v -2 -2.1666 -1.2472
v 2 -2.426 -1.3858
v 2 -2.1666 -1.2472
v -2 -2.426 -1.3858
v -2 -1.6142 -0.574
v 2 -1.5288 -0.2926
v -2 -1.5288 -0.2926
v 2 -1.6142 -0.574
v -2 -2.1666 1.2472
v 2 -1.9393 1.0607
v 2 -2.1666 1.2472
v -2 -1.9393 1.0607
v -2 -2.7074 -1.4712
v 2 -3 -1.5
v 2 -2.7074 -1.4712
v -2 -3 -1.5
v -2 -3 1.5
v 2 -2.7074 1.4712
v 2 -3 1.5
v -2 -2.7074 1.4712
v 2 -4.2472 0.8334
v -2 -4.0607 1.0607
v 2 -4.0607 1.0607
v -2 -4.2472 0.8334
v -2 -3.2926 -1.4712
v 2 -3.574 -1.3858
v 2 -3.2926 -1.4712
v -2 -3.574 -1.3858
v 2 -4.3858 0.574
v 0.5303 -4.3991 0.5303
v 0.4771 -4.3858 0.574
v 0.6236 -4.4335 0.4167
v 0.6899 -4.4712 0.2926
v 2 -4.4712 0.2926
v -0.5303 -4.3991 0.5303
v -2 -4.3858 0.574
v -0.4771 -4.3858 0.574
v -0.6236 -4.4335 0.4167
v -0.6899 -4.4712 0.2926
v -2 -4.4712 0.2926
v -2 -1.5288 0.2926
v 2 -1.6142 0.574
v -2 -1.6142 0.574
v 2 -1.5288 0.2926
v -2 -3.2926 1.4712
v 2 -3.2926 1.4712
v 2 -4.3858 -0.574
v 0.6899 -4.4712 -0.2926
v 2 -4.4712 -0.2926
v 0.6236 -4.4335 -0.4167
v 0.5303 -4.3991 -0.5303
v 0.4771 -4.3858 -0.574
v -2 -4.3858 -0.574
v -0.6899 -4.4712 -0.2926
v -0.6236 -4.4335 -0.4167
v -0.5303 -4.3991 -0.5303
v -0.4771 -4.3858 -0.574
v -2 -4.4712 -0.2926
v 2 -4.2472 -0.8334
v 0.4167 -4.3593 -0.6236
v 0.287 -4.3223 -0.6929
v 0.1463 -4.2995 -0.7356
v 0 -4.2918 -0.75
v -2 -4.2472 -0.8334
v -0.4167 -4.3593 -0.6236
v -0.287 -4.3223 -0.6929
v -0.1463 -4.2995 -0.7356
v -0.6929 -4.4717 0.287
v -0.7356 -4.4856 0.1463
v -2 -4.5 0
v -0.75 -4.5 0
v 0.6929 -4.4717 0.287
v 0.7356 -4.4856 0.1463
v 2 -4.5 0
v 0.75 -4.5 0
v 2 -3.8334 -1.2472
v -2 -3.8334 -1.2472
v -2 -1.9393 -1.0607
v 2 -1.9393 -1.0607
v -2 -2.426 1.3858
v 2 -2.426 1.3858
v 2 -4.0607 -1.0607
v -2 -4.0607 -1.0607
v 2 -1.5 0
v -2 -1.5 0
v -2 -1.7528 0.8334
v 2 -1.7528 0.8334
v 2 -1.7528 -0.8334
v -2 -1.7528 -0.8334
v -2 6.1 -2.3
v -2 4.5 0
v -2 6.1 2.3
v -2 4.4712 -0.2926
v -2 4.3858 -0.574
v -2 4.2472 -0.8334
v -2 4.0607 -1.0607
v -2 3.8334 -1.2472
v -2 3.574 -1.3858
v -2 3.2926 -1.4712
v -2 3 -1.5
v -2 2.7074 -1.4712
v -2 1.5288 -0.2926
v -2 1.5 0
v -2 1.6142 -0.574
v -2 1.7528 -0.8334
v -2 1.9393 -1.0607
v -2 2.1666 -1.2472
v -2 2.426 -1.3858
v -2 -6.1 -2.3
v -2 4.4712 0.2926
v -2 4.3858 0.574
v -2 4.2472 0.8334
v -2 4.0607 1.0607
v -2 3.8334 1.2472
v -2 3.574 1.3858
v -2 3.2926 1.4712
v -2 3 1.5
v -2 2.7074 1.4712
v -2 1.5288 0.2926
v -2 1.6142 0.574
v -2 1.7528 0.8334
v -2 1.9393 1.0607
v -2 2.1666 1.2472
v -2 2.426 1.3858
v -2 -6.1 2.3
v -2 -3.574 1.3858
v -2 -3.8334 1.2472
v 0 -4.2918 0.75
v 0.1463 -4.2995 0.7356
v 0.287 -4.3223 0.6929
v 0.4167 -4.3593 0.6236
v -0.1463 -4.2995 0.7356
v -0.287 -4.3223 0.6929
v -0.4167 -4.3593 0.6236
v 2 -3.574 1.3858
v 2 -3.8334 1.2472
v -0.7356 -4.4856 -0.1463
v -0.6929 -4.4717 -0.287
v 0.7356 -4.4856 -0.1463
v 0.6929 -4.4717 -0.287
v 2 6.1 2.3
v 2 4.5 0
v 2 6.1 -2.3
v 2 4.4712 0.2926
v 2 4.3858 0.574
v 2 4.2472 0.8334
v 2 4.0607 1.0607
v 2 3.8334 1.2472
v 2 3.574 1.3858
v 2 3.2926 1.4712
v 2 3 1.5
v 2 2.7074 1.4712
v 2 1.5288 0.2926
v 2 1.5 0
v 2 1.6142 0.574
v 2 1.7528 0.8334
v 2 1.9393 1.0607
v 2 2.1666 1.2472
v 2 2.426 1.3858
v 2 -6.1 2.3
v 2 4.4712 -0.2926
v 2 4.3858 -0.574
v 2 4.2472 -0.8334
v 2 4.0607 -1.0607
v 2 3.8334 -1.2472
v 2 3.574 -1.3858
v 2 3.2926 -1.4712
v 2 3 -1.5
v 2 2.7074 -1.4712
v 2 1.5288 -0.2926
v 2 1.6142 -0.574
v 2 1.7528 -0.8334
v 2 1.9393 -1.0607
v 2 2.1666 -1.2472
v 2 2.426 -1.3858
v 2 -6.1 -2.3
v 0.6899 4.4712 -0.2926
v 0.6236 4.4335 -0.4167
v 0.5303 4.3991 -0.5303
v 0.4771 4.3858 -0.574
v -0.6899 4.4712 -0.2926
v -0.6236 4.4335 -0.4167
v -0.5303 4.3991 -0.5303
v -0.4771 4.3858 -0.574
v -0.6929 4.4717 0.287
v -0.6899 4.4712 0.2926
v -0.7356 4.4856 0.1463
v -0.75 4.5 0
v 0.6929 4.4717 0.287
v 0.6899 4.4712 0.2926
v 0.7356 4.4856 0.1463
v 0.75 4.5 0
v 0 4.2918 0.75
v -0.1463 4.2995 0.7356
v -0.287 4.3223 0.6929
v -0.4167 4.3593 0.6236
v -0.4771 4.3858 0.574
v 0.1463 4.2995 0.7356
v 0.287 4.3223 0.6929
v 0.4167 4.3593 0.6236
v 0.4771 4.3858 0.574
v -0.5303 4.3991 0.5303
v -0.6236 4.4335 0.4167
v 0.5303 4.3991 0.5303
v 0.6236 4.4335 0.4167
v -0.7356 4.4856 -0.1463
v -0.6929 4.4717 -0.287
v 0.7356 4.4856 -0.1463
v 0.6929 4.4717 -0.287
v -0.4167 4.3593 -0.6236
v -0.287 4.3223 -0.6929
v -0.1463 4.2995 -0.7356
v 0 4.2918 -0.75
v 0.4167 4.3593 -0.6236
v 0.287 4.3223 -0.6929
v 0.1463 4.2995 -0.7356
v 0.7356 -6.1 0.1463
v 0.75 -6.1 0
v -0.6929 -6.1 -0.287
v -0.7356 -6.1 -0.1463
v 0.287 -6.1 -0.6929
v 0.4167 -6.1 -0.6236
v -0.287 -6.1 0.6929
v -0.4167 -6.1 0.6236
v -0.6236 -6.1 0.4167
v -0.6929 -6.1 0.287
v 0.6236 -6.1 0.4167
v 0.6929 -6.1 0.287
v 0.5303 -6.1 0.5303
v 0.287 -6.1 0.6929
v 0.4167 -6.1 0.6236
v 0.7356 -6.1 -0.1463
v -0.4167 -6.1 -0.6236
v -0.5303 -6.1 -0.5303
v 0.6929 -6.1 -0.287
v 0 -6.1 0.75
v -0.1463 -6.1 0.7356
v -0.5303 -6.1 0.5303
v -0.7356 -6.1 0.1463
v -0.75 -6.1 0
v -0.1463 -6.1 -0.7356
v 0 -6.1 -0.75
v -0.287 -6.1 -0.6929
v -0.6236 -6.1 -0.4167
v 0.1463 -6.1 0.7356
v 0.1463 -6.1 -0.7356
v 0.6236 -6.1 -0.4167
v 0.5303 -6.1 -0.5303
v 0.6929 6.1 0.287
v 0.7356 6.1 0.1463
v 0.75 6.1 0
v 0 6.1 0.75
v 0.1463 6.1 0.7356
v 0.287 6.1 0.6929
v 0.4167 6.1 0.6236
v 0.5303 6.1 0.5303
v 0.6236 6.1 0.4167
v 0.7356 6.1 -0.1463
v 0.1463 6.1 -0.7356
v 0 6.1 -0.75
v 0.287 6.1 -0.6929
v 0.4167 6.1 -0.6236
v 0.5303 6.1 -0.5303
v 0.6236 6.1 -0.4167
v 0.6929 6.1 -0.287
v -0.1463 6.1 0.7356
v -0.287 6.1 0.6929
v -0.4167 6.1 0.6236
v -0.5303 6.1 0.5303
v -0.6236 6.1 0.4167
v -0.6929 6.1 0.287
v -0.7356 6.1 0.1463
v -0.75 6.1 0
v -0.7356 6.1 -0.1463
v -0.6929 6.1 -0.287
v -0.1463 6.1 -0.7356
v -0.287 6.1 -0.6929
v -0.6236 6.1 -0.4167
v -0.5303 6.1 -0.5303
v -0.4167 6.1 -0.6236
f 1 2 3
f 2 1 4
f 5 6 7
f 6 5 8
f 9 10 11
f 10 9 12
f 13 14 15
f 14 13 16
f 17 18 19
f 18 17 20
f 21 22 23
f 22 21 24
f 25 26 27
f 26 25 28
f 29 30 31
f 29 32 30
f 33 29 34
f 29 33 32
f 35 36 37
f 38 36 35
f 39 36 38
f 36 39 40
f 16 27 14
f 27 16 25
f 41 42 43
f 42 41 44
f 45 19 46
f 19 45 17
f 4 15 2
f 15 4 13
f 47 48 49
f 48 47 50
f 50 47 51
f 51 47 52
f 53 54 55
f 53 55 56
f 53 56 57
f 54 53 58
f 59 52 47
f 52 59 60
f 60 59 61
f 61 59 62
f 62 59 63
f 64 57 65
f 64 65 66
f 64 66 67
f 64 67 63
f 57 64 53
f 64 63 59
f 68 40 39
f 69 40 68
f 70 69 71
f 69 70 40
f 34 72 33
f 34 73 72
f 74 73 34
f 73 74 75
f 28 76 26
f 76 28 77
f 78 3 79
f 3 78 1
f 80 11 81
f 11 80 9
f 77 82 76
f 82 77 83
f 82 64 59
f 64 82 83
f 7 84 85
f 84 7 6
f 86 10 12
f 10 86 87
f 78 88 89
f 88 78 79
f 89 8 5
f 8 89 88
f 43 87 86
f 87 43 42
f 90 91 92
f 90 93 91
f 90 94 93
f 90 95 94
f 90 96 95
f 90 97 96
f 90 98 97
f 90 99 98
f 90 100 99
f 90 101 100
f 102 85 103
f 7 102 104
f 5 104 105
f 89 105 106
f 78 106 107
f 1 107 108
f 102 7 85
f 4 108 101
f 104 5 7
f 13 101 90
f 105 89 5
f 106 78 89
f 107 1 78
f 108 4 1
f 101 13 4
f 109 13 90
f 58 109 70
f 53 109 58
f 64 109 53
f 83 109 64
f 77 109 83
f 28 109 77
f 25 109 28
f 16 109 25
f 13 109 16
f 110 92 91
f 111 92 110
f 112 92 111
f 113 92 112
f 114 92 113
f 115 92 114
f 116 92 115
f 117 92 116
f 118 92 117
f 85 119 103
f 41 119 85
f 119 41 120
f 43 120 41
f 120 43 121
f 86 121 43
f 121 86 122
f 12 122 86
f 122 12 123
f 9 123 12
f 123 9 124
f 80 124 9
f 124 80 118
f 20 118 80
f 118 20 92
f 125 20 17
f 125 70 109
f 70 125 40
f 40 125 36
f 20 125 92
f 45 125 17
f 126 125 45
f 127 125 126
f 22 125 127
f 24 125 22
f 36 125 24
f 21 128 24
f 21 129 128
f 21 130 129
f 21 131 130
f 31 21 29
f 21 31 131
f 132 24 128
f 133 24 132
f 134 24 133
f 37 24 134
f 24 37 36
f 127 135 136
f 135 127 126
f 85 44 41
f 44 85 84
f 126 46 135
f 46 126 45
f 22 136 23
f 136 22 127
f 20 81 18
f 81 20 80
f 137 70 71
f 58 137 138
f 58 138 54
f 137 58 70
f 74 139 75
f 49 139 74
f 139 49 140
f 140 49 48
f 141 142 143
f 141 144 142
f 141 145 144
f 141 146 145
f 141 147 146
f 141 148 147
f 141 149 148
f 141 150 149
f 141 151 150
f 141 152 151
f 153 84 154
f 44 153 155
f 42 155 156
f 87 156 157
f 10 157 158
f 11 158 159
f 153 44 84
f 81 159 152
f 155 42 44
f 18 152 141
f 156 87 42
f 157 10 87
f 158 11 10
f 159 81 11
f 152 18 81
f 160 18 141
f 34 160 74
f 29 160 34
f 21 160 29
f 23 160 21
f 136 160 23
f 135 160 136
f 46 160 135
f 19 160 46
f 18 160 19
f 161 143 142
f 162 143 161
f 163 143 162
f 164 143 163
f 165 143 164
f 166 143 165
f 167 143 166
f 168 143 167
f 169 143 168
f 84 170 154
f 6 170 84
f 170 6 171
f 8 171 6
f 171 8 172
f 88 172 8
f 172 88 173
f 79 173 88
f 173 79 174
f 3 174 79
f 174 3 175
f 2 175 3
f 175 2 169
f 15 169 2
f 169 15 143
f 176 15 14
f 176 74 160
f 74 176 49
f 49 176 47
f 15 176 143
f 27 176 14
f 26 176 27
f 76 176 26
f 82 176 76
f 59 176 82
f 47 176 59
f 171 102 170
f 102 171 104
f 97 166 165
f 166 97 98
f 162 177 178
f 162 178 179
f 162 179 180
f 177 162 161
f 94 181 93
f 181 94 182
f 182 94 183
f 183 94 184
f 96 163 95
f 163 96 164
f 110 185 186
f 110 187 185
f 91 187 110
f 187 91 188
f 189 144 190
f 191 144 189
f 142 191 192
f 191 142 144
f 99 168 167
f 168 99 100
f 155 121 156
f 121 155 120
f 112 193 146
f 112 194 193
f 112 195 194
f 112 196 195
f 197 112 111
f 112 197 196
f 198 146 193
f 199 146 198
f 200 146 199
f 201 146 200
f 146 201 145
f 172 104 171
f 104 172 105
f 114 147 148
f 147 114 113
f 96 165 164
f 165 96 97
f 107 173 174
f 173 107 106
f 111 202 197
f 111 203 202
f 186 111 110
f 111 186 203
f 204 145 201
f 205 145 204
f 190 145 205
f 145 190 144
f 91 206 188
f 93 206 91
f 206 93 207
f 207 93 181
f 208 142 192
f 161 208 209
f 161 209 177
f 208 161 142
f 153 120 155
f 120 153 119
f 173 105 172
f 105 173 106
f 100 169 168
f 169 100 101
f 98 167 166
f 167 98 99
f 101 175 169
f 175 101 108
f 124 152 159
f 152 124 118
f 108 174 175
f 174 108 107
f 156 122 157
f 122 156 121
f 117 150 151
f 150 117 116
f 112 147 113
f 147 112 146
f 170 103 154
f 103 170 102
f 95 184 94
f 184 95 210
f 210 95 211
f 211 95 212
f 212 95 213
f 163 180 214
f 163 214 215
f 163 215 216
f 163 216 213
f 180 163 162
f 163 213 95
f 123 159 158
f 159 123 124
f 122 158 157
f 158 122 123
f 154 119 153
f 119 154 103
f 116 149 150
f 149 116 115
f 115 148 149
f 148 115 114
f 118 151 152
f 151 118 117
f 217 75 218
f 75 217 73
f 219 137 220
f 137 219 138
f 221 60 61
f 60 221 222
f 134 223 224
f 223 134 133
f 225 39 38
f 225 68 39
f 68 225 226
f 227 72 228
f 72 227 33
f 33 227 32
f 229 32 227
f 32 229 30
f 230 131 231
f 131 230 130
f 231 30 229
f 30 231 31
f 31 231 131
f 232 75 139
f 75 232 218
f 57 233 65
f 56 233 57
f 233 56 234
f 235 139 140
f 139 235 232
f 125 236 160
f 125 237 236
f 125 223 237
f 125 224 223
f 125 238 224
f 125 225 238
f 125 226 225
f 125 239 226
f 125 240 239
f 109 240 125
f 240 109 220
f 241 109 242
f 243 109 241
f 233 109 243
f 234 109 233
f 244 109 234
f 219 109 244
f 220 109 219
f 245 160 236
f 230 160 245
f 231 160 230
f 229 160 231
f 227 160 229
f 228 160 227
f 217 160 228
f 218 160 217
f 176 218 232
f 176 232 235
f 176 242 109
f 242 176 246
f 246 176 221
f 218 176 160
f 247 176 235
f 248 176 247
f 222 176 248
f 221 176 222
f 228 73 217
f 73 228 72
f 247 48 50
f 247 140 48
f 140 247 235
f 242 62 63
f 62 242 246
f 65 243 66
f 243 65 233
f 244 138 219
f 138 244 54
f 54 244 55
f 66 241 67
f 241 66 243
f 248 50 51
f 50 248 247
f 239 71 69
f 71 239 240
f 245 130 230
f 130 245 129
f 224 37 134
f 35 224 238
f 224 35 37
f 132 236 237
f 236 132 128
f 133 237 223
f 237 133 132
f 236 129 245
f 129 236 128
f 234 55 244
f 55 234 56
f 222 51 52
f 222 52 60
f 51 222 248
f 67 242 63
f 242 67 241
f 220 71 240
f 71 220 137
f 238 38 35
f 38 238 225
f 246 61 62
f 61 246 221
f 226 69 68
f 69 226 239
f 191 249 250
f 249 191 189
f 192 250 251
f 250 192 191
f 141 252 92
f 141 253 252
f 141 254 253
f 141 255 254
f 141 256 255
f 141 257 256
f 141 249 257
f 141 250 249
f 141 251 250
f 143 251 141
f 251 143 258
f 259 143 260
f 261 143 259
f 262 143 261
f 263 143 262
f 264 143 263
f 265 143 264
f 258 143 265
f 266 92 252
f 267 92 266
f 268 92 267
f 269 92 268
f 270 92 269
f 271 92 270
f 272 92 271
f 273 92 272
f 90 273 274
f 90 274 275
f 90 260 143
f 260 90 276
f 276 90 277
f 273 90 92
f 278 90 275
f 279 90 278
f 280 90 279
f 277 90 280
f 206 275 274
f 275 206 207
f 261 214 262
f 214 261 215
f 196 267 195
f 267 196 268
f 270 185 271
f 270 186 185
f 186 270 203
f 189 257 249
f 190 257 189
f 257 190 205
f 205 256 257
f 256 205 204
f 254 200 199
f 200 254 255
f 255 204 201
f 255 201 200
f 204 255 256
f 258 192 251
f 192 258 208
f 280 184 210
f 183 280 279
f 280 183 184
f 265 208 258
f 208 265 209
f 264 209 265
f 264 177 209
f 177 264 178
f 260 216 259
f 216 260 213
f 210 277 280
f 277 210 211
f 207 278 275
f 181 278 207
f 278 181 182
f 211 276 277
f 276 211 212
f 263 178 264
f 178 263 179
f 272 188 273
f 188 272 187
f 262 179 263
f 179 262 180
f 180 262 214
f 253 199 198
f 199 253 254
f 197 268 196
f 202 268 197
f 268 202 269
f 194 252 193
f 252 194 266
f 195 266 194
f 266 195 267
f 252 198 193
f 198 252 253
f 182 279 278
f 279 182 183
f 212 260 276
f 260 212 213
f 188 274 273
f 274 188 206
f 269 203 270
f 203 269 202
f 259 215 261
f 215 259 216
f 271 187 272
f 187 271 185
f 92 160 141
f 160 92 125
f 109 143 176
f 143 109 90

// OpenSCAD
// file: Helper.scad
// collection of helper functions and modules

$fn=32;


/////////////////////// Functions ///////////////////////////
function defined(variable) = str(variable) != "undef"; 



/////////////////////// Objects /////////////////////////////

// creates a hole on with given depth and diameter 
// with its center at x,y,z 
// of the given plane
module mkhole(diameter,depth,plane="xy",x=0,y=0,z=0)
{
        if(plane=="xy")
            translate([x,y,z])
                translate([0,0,depth/2])
                    cylinder(d=diameter,h=depth, center=true);
      
        if(plane=="xz")
            translate([x,y,z])
                translate([0,depth/2,0])
                    rotate([90,0,0])
                        cylinder(d=diameter,h=depth, center=true);
        
        if(plane=="yz")
            translate([x,y,z])
                translate([depth/2,0,0])
                    rotate([0,90,0])
                        cylinder(d=diameter,h=depth, center=true);
}


// create a foot for objects starting at z with given height
module mkfoot(height,z){
    translate([0,0,z])
        linear_extrude(height=height)
            projection() children();
}


// create a length indicator with text - l=length, t=text
module Spacer(l,t){
    // move with beginning to zero on x axis
    translate([l/2,0,0]){
        linear_extrude(height=0.1){
            // create spacer line
            square([l,0.1],center=true);

            // create end caps
            translate([-l/2,0,0])
                square([0.1,1],center=true);
            translate([l/2,0,0])
                square([0.1,1],center=true);

            // add text
            text(text = str(t,": ",l),
                 size=1,
                 halign="center",
                 valign="bottom");
        }
    }
}
// main file
use <Helper.scad>;

$fn=32;

// render with example values
Endcaps(length=4,
        wall=0.8,
        hole_distance=6,
        hole_diameter=3,
        screw_diameter=1.5);


module Endcaps(length,
               wall,
               hole_distance,
               hole_diameter,
               screw_diameter)
{
    
    
    //////////////// Variables ////////////////////////
    height  = hole_diameter + 2 * wall;
    width   = hole_distance + hole_diameter + 4 * wall;
    
    
    //////////////// Rendering ////////////////////////
    object();
    
    
    //////////////// Modules //////////////////////////
    module object()
    {
        difference(){
            cube([length,width,height], center = true);
            holes();
        }
    }

    module holes(){
        // holes for rods
        for (y=[-hole_distance/2,hole_distance/2]){
            mkhole(diameter=hole_diameter,
                   depth=length,
                   plane="yz",
                   x=-length/2,
                   y=y);
        }
        
        // holes for screws
        for (y=[-width/2,width/2-3*wall]){
            mkhole(diameter=screw_diameter,
                   depth=3*wall,
                   plane="xz",
                   y=y);
        }
    }
}
